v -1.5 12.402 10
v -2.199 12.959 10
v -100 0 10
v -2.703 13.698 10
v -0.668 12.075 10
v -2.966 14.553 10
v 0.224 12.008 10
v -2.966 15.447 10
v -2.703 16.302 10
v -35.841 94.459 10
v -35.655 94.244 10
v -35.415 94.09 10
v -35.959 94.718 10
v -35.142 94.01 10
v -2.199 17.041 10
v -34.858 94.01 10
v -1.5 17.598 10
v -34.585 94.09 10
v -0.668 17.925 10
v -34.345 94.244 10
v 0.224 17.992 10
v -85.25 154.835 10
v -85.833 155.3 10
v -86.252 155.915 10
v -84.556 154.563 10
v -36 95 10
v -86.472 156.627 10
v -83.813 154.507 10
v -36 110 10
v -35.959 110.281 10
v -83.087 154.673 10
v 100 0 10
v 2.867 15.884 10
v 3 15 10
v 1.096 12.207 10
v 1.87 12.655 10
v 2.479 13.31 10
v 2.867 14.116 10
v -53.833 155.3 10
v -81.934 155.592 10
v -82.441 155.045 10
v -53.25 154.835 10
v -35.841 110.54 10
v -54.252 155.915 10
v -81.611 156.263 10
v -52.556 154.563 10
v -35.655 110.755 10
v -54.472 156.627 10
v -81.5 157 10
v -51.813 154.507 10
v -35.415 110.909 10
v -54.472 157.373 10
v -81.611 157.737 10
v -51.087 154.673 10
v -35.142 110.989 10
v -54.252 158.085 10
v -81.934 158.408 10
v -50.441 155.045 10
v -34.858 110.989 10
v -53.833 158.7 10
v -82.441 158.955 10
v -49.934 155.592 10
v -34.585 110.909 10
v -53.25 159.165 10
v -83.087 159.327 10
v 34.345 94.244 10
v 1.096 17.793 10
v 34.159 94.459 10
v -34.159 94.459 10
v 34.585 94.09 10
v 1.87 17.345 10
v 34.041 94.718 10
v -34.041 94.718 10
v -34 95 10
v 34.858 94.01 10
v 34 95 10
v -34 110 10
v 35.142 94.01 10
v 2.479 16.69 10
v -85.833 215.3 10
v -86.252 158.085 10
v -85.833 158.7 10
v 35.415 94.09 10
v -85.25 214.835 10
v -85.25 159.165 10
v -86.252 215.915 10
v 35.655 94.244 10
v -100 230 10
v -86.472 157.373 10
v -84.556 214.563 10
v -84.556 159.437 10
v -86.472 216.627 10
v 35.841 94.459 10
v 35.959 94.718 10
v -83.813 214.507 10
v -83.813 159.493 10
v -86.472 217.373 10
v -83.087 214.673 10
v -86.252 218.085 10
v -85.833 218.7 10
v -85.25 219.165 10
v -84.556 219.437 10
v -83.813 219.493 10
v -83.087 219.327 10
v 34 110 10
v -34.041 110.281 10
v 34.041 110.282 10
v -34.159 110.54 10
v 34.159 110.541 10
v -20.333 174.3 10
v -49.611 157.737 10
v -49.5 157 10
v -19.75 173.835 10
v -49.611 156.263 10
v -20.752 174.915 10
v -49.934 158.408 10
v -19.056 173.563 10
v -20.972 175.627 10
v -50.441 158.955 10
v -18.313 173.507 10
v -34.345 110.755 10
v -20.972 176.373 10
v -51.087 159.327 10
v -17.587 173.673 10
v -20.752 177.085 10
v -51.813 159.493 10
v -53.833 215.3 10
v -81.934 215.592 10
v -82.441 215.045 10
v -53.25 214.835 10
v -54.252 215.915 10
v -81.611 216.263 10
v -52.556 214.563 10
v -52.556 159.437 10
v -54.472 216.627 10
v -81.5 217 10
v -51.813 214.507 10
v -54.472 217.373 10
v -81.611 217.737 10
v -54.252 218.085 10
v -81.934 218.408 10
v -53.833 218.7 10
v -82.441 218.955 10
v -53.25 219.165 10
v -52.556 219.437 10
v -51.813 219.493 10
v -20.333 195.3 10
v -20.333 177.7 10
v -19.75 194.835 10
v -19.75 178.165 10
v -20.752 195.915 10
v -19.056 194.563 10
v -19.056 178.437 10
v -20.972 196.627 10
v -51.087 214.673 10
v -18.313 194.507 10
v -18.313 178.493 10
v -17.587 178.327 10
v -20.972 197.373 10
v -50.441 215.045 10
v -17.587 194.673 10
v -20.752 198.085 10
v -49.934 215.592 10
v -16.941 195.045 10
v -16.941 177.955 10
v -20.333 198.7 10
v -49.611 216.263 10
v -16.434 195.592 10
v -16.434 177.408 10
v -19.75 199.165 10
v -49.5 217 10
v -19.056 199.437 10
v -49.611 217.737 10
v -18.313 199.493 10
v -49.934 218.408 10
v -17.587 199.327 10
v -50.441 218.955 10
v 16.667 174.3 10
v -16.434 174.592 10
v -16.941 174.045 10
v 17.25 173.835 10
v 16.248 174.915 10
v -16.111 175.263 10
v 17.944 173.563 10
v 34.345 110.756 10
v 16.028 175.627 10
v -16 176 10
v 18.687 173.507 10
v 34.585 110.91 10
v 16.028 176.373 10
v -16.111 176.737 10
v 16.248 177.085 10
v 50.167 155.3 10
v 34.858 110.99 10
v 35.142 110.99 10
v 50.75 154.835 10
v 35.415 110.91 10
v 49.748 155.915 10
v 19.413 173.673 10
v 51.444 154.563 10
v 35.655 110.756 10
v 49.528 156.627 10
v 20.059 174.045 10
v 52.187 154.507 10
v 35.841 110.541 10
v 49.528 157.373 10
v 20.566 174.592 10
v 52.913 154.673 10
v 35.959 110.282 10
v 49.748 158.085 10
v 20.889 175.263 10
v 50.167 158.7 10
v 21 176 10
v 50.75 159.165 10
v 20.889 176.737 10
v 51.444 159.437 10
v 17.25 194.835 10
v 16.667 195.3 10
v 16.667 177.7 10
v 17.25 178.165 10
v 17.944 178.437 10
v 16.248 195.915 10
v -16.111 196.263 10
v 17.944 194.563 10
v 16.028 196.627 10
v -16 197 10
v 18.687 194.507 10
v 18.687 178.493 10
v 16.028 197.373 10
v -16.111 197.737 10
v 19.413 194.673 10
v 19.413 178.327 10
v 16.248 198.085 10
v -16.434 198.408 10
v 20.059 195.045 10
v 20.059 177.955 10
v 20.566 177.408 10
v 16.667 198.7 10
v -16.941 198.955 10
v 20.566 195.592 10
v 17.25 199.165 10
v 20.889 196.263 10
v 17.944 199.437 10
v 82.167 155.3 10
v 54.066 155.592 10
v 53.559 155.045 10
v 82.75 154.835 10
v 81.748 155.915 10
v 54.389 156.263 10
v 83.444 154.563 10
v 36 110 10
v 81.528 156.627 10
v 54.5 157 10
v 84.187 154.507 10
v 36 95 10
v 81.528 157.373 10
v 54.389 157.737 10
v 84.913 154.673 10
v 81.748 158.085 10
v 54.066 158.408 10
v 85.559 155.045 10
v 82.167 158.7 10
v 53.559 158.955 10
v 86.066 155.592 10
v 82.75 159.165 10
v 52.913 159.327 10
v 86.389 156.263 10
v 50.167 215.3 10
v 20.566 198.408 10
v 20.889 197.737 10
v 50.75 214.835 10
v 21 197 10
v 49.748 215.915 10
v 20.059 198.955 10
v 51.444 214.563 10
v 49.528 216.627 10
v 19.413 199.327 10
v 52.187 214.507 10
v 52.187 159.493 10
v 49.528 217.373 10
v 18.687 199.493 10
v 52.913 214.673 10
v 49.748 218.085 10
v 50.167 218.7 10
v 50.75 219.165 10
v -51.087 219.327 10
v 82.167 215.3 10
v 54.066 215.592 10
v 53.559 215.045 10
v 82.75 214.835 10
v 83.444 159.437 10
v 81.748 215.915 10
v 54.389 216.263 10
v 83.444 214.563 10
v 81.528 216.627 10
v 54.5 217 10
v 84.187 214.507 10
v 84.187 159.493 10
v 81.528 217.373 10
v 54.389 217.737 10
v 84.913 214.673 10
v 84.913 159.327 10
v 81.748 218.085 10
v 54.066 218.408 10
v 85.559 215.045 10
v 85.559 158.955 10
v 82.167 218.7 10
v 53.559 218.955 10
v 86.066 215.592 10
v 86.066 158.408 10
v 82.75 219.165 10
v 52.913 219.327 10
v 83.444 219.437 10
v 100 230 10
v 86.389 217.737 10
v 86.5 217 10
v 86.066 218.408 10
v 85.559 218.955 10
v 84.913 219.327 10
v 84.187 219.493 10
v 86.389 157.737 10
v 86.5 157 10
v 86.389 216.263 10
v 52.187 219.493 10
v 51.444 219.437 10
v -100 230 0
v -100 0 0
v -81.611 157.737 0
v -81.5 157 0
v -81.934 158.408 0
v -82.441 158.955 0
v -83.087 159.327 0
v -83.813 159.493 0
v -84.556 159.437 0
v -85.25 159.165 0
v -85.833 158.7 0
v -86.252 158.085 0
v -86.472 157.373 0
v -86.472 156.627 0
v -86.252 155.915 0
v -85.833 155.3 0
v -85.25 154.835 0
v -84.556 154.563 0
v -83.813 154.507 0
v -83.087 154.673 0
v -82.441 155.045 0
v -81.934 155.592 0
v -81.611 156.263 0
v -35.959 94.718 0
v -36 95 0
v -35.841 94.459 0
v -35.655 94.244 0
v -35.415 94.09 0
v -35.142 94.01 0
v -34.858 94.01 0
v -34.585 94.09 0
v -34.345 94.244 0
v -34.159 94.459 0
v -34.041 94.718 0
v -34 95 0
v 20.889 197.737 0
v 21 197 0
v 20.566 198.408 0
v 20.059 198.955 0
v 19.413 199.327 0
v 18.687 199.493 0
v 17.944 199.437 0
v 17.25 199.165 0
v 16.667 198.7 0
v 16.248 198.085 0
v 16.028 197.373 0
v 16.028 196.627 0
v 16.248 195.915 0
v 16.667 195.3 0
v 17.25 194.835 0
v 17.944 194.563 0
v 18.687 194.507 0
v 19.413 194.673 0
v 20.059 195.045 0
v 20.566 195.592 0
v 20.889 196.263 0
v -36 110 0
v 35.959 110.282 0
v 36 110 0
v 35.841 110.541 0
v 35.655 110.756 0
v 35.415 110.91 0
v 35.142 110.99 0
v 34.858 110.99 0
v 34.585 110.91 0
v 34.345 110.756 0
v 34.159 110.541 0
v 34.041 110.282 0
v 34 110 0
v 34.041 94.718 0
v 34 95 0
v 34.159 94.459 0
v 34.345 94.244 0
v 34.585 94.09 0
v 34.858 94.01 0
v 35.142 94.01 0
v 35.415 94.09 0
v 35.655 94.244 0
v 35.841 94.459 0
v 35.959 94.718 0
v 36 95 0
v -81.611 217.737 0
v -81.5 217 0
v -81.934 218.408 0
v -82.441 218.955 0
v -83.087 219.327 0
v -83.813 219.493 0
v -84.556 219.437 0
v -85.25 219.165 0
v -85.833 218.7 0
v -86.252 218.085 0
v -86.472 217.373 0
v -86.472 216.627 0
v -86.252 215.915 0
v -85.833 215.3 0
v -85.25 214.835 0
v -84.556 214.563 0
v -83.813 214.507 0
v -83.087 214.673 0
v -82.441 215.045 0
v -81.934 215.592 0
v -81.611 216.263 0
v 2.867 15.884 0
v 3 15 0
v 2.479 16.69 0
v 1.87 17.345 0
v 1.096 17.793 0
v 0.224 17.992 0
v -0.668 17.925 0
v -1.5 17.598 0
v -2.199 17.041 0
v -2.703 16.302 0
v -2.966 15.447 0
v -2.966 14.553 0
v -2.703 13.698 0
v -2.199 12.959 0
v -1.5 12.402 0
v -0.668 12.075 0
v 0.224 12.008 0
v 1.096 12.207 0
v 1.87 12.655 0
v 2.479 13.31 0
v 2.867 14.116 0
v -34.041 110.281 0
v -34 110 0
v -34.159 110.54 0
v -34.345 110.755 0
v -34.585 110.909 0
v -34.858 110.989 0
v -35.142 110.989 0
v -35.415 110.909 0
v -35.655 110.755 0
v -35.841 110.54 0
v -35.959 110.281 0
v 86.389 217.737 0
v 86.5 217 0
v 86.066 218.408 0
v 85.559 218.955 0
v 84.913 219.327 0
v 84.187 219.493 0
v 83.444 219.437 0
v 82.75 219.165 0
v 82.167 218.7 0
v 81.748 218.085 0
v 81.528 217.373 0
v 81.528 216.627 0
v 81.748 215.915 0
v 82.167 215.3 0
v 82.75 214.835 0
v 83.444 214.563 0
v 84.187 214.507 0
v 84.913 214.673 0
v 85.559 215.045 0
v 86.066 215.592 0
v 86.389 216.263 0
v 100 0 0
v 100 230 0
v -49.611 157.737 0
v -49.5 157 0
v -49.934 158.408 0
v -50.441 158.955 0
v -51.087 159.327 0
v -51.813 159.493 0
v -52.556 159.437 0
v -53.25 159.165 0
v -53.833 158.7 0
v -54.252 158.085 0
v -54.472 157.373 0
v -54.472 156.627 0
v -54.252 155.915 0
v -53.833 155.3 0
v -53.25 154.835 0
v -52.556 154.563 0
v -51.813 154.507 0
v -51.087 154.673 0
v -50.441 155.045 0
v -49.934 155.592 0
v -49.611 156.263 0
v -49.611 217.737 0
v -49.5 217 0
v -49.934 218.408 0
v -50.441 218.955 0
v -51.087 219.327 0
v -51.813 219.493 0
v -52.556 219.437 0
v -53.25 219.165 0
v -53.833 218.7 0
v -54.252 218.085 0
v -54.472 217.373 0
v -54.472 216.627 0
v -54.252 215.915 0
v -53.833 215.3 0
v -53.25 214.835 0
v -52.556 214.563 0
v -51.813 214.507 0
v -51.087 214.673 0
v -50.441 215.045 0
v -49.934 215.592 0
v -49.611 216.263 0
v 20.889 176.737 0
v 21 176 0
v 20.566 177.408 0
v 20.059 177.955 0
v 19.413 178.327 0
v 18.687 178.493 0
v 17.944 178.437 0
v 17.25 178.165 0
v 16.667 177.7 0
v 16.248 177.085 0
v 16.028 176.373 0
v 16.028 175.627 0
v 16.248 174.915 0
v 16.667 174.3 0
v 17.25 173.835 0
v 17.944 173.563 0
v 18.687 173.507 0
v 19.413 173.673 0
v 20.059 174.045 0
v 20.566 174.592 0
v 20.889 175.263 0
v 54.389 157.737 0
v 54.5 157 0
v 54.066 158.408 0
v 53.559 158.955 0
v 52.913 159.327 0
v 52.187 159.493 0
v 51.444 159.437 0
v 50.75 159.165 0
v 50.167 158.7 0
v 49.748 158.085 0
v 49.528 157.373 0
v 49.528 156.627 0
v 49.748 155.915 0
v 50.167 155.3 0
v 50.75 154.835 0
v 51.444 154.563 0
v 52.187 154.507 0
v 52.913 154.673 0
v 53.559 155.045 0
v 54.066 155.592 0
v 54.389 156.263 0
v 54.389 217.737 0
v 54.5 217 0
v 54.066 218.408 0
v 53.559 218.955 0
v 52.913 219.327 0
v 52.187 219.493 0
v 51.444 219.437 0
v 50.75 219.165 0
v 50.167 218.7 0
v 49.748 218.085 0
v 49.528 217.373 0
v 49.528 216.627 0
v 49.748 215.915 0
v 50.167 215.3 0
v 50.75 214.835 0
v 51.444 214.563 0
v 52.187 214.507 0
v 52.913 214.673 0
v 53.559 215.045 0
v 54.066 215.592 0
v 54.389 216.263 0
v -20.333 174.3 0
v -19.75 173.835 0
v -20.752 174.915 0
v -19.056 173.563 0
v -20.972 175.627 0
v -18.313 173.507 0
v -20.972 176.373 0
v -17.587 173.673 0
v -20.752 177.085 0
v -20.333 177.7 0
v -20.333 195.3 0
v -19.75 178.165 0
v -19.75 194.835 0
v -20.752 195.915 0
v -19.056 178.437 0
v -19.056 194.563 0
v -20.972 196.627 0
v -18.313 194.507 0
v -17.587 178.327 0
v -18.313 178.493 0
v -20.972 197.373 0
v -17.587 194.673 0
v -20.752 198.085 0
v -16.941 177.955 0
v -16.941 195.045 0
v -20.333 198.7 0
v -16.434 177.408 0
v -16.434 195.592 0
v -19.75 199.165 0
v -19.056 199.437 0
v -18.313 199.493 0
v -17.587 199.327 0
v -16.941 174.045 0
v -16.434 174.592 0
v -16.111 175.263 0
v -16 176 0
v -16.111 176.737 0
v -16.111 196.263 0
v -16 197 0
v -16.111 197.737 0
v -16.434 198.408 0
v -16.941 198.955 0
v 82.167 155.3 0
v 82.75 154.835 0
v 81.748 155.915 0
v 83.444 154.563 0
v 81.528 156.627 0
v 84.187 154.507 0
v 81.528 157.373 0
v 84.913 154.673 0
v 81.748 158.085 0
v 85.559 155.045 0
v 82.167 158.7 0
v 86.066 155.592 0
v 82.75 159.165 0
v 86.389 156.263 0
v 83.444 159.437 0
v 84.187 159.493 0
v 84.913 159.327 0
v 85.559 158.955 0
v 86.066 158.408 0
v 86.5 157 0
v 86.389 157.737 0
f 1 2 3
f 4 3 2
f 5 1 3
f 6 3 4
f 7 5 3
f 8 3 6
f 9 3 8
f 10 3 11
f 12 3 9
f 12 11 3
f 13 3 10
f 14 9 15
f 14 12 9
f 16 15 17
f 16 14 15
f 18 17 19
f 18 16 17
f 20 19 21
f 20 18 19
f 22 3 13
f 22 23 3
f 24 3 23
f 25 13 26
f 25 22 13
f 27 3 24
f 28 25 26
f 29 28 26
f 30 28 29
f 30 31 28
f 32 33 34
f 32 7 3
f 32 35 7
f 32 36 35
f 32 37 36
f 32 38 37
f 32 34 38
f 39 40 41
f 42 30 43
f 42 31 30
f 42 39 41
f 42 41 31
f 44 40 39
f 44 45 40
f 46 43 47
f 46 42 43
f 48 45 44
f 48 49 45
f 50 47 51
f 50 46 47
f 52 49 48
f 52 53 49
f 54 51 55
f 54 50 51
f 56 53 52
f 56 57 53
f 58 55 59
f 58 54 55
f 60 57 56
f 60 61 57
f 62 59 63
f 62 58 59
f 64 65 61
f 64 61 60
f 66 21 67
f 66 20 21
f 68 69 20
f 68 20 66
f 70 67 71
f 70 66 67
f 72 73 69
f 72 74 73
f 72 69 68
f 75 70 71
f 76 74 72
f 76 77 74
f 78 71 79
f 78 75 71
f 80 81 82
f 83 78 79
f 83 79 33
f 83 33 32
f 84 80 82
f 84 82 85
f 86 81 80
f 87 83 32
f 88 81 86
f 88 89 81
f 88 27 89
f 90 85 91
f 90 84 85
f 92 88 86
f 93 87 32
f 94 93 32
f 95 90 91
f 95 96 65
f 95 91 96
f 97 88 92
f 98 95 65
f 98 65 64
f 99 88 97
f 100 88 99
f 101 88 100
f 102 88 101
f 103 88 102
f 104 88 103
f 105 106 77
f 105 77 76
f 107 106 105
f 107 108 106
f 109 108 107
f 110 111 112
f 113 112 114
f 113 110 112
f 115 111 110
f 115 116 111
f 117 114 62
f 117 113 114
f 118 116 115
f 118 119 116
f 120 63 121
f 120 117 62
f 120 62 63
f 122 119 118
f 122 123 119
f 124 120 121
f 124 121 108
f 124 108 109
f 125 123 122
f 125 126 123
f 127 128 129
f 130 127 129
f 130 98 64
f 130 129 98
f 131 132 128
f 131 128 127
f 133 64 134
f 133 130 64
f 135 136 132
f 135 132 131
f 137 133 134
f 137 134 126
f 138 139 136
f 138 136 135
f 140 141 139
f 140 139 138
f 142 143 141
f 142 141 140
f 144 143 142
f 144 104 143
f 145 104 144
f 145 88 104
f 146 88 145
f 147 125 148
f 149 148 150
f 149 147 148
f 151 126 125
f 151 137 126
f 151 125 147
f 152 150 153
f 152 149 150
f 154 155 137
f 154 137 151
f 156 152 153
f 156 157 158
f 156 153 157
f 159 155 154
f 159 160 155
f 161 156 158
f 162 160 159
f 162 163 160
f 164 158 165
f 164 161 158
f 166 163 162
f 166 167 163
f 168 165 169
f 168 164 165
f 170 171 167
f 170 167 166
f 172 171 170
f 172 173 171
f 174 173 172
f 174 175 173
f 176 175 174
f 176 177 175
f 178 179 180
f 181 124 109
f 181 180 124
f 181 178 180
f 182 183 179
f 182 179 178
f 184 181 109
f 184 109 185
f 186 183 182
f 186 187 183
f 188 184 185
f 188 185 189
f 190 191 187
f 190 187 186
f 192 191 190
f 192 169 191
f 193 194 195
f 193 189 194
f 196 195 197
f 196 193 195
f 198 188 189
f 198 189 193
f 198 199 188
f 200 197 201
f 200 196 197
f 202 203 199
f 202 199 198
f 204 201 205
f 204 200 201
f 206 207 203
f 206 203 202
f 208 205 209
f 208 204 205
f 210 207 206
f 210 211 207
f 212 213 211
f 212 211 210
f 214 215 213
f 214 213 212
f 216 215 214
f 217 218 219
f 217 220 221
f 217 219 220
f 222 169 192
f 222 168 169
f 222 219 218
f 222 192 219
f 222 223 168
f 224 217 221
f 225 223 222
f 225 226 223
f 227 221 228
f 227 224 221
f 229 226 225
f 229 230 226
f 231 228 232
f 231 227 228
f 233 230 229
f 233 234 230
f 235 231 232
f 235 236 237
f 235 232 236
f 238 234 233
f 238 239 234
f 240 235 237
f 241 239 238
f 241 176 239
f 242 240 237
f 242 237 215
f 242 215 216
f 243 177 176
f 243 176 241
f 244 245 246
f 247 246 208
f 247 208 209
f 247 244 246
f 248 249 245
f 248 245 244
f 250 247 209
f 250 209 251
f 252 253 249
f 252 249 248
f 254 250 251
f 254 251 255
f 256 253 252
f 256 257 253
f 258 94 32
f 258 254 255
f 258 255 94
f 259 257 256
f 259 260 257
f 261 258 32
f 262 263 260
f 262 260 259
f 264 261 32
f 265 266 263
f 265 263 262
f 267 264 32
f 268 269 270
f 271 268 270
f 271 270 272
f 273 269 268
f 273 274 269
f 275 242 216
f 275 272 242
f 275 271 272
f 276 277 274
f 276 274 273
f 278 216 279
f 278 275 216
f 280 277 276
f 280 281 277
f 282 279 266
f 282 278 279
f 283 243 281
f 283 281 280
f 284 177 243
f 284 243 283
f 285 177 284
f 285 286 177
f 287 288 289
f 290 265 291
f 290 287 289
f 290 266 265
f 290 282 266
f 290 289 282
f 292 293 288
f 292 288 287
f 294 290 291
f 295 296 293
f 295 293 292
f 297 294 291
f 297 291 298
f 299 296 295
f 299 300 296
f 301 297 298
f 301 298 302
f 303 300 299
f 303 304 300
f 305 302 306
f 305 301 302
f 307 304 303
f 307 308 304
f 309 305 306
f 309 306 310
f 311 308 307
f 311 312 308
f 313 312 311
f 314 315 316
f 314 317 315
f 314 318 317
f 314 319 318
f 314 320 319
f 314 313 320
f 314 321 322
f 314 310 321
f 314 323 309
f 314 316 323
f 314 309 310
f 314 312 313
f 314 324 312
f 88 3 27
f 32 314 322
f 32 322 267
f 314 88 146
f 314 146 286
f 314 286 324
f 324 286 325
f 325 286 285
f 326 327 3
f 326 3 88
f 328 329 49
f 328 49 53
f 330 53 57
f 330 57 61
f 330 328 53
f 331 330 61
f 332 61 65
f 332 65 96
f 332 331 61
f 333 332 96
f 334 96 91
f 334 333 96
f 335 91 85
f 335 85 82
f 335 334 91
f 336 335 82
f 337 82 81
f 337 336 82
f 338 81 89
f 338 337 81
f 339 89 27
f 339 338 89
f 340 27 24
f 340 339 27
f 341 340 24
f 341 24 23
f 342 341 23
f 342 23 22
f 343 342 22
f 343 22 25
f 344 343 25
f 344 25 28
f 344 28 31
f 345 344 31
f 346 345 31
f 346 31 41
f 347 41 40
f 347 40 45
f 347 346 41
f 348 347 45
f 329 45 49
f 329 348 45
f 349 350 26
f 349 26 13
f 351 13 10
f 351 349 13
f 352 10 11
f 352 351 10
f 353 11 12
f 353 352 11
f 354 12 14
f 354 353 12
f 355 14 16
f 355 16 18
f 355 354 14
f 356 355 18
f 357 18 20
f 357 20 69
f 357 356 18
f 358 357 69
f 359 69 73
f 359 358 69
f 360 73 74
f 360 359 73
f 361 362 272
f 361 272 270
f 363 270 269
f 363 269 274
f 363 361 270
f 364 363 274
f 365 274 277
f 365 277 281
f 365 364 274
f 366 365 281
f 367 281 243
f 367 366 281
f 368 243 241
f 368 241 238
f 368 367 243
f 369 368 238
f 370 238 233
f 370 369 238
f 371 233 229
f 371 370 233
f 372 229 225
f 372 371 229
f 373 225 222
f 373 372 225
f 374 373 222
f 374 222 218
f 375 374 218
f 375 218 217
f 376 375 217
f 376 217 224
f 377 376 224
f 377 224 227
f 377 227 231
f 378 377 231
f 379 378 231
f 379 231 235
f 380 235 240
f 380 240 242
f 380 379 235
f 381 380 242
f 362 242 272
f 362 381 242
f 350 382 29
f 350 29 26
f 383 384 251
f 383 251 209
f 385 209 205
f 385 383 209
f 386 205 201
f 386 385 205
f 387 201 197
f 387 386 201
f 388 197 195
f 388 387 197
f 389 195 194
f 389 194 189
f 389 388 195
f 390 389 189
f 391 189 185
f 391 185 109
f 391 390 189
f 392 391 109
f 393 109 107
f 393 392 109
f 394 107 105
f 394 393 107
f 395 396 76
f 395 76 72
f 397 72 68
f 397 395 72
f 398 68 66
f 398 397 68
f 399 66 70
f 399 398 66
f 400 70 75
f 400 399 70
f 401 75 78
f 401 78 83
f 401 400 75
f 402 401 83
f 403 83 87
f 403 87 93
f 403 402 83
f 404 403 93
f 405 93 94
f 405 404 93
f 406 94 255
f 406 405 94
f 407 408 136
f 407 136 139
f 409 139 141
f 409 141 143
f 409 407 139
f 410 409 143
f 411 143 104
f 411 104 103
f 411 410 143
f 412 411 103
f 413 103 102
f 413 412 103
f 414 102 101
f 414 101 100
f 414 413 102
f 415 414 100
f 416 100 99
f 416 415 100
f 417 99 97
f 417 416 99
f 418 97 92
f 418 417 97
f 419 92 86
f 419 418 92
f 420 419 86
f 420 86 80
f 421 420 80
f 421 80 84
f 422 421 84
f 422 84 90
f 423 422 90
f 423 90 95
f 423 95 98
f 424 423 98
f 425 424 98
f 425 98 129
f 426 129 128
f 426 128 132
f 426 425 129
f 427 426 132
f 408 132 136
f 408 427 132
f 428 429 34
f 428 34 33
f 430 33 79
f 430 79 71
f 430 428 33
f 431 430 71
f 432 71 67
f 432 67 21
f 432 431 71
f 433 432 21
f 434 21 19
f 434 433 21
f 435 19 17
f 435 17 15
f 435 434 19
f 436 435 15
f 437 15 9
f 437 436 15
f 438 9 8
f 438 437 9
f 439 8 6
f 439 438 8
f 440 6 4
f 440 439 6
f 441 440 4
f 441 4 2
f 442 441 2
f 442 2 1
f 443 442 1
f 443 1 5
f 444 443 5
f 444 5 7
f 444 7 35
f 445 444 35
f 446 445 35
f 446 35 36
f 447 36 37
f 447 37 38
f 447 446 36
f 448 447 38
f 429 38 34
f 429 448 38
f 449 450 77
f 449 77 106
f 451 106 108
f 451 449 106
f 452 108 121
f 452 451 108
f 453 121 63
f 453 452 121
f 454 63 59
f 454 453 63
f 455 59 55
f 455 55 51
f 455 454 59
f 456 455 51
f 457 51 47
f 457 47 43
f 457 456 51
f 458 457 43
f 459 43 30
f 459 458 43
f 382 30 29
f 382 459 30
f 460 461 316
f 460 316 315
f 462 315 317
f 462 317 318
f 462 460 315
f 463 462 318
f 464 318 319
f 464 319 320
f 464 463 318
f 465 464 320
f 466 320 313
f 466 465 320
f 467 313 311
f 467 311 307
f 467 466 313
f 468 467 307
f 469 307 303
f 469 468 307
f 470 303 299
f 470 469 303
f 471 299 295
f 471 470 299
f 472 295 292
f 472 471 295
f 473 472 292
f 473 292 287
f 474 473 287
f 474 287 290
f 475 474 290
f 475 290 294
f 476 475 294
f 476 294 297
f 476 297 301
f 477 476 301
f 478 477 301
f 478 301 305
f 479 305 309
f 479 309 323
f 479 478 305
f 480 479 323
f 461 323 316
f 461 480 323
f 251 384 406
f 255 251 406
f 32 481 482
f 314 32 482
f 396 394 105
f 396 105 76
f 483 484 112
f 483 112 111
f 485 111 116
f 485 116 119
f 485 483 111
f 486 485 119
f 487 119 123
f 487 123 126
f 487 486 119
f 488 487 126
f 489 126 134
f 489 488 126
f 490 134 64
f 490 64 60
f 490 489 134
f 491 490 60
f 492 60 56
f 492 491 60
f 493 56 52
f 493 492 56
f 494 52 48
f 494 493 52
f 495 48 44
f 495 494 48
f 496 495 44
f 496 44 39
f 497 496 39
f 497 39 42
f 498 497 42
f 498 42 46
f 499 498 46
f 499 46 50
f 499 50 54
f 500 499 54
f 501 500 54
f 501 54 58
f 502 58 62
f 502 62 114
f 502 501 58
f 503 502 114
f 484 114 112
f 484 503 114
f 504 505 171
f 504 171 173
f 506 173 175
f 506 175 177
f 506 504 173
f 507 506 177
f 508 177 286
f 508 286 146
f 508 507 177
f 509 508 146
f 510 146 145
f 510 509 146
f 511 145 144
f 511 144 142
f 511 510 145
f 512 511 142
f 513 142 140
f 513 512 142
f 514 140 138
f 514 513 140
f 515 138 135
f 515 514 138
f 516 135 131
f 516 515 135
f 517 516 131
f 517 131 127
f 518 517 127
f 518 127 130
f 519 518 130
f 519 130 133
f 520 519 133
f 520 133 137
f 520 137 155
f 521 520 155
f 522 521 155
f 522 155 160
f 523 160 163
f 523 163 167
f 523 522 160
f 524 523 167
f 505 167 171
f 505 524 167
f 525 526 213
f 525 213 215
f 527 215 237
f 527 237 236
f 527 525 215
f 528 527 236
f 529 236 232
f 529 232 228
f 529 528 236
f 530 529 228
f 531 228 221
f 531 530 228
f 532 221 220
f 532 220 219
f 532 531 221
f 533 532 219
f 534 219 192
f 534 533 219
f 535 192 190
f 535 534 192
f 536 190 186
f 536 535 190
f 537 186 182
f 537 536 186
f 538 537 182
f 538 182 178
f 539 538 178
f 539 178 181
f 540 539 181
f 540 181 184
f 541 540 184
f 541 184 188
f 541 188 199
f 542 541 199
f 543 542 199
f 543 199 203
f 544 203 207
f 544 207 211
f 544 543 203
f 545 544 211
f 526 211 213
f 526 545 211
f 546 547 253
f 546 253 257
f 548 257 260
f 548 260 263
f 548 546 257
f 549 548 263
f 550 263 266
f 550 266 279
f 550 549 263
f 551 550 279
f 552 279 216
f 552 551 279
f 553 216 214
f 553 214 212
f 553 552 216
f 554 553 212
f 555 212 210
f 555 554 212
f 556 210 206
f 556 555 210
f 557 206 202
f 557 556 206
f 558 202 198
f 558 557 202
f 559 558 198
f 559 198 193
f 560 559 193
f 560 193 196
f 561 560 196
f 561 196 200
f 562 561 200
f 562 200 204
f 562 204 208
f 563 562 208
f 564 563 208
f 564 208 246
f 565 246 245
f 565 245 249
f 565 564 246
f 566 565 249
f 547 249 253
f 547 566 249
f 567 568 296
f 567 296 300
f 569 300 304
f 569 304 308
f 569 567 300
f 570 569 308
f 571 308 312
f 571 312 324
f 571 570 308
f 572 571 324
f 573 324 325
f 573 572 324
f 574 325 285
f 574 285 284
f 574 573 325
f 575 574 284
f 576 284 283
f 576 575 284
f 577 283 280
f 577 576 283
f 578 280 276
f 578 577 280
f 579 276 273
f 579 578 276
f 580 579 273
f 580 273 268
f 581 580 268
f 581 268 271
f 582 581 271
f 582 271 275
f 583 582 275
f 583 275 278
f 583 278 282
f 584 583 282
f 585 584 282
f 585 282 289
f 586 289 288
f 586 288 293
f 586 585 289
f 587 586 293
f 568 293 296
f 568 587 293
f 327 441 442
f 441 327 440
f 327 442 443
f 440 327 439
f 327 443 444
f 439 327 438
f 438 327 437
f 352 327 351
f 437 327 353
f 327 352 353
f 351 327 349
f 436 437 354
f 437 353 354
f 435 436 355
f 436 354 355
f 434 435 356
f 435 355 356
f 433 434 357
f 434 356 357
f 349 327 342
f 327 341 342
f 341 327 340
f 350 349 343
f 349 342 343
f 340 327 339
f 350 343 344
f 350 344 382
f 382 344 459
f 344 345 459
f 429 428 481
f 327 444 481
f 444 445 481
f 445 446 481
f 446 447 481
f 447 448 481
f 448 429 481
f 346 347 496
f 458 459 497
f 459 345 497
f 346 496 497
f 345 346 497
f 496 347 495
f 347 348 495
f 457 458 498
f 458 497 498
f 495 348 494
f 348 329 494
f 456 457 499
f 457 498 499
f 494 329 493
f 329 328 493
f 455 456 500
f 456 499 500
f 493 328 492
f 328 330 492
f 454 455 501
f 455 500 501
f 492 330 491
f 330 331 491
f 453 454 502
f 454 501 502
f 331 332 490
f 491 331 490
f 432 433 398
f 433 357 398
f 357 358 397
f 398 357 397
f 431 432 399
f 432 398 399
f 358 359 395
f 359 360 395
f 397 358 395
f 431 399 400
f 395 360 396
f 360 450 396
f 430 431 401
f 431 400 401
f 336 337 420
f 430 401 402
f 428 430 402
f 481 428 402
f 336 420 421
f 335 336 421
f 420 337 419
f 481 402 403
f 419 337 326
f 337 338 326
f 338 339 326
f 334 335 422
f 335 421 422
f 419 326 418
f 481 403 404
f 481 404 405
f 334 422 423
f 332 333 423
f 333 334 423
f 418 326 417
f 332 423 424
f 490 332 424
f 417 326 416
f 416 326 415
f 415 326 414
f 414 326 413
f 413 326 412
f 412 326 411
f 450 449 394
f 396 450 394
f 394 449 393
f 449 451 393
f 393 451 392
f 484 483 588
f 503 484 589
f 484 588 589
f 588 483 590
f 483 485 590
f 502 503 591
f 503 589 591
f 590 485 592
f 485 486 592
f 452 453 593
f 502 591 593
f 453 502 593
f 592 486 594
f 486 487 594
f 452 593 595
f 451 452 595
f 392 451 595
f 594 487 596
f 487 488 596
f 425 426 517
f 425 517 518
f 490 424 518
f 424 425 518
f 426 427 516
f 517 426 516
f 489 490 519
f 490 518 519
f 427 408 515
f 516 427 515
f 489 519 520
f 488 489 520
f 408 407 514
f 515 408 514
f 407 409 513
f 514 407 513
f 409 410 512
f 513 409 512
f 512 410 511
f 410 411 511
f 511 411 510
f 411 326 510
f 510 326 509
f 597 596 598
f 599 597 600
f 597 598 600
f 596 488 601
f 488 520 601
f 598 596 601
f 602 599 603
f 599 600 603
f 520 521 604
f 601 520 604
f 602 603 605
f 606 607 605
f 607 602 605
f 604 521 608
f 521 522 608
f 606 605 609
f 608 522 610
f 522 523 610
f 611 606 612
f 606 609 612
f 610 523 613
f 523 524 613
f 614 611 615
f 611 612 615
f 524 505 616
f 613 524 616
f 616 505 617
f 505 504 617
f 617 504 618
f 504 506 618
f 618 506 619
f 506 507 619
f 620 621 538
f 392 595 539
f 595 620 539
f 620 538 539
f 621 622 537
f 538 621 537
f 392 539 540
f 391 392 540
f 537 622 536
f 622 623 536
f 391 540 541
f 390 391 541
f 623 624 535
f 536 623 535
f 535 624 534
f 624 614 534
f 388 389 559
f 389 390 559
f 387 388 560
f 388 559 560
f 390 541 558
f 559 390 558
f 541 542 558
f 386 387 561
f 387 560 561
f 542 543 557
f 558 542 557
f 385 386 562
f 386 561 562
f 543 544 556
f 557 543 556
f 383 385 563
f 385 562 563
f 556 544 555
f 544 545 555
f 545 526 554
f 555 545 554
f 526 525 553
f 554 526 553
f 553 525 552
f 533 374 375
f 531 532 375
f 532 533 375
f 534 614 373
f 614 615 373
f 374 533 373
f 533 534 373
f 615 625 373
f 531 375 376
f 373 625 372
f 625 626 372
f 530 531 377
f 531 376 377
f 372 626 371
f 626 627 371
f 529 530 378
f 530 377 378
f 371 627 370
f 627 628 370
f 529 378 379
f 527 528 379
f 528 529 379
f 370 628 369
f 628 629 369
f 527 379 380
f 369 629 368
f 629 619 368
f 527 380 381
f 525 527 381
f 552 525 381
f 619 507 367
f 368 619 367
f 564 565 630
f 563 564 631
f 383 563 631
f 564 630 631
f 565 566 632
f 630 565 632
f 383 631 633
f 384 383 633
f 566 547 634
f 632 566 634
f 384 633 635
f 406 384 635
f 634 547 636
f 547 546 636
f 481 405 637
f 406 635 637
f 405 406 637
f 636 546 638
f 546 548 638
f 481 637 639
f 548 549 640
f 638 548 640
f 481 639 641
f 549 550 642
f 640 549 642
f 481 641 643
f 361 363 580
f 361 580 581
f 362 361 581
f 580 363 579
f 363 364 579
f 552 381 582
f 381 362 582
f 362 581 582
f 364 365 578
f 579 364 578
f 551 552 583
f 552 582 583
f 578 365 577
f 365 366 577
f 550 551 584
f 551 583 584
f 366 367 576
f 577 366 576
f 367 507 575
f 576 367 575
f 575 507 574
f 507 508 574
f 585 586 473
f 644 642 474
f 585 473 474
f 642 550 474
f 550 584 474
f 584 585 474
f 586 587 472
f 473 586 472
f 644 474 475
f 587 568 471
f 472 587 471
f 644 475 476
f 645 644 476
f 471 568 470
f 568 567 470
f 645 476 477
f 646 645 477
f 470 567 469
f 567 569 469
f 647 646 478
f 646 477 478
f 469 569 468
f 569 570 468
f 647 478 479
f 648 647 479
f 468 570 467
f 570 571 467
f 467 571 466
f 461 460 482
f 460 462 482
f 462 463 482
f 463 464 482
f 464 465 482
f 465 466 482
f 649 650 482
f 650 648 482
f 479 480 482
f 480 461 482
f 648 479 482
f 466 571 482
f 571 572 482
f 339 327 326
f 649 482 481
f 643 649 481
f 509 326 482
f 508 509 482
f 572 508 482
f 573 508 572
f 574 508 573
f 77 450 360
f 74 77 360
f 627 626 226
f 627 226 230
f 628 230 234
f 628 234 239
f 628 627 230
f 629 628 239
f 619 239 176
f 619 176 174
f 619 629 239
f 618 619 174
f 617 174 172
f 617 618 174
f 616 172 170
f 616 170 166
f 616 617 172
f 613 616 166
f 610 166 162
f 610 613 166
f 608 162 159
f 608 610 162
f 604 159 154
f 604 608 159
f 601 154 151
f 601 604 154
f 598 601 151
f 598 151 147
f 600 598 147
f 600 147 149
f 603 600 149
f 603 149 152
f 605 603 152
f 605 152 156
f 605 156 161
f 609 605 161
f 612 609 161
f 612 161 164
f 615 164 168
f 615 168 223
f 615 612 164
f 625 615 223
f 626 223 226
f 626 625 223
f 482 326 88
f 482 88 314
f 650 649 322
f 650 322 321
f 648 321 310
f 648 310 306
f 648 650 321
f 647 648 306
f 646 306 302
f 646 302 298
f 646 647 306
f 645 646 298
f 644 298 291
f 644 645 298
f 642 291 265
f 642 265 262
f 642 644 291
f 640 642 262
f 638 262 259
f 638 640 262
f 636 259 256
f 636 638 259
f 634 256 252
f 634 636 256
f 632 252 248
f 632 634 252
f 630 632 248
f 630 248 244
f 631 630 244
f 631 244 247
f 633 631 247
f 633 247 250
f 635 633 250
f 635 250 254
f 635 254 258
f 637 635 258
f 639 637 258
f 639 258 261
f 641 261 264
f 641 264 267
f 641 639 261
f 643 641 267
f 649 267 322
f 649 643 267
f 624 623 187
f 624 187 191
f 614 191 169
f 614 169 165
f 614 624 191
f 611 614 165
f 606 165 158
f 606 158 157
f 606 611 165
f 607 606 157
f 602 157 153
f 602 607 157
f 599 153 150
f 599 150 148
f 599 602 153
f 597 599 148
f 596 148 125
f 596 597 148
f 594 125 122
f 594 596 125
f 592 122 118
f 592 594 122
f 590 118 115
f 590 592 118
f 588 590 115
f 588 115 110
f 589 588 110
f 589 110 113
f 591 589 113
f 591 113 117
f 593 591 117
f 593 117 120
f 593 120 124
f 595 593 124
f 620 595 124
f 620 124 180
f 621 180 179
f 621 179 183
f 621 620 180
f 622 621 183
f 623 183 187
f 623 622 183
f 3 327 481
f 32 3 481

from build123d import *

# Parameters (mm, degrees)
SKETCH_W   = 200
SKETCH_H   = 230
SKETCH_R   = 3
SKETCH_R_2 = 2.5
PAD_DEPTH  = 10


with BuildPart() as part:
    # Sketch → Pad (new body)
    with BuildSketch(Plane.XY):
        with Locations((0, 115)):
            Rectangle(SKETCH_W, SKETCH_H)
        with Locations((0, 15)):
            Circle(SKETCH_R, mode=Mode.SUBTRACT)
        with Locations((84, 217)):
            Circle(SKETCH_R_2, mode=Mode.SUBTRACT)
        with Locations((84, 157)):
            Circle(SKETCH_R_2, mode=Mode.SUBTRACT)
        with Locations((52, 157)):
            Circle(SKETCH_R_2, mode=Mode.SUBTRACT)
        with Locations((52, 217)):
            Circle(SKETCH_R_2, mode=Mode.SUBTRACT)
        with Locations((-84, 217)):
            Circle(SKETCH_R_2, mode=Mode.SUBTRACT)
        with Locations((-52, 217)):
            Circle(SKETCH_R_2, mode=Mode.SUBTRACT)
        with Locations((-84, 157)):
            Circle(SKETCH_R_2, mode=Mode.SUBTRACT)
        with Locations((-52, 157)):
            Circle(SKETCH_R_2, mode=Mode.SUBTRACT)
        with Locations((-18.5, 197)):
            Circle(SKETCH_R_2, mode=Mode.SUBTRACT)
        with Locations((18.5, 197)):
            Circle(SKETCH_R_2, mode=Mode.SUBTRACT)
        with Locations((-18.5, 176)):
            Circle(SKETCH_R_2, mode=Mode.SUBTRACT)
        with Locations((18.5, 176)):
            Circle(SKETCH_R_2, mode=Mode.SUBTRACT)
        with BuildLine():
            ThreePointArc((36, 110), (35, 111), (34, 110))
            Line((34, 110), (34, 95))
            ThreePointArc((34, 95), (35, 94), (36, 95))
            Line((36, 110), (36, 95))
        make_face(mode=Mode.SUBTRACT)
        with BuildLine():
            ThreePointArc((-34, 109.999637), (-35, 110.999637), (-36, 109.999637))
            Line((-36, 109.999637), (-36, 95))
            ThreePointArc((-36, 95), (-35, 94), (-34, 95))
            Line((-34, 109.999637), (-34, 95))
        make_face(mode=Mode.SUBTRACT)
    extrude(amount=PAD_DEPTH)


solid = part.part
